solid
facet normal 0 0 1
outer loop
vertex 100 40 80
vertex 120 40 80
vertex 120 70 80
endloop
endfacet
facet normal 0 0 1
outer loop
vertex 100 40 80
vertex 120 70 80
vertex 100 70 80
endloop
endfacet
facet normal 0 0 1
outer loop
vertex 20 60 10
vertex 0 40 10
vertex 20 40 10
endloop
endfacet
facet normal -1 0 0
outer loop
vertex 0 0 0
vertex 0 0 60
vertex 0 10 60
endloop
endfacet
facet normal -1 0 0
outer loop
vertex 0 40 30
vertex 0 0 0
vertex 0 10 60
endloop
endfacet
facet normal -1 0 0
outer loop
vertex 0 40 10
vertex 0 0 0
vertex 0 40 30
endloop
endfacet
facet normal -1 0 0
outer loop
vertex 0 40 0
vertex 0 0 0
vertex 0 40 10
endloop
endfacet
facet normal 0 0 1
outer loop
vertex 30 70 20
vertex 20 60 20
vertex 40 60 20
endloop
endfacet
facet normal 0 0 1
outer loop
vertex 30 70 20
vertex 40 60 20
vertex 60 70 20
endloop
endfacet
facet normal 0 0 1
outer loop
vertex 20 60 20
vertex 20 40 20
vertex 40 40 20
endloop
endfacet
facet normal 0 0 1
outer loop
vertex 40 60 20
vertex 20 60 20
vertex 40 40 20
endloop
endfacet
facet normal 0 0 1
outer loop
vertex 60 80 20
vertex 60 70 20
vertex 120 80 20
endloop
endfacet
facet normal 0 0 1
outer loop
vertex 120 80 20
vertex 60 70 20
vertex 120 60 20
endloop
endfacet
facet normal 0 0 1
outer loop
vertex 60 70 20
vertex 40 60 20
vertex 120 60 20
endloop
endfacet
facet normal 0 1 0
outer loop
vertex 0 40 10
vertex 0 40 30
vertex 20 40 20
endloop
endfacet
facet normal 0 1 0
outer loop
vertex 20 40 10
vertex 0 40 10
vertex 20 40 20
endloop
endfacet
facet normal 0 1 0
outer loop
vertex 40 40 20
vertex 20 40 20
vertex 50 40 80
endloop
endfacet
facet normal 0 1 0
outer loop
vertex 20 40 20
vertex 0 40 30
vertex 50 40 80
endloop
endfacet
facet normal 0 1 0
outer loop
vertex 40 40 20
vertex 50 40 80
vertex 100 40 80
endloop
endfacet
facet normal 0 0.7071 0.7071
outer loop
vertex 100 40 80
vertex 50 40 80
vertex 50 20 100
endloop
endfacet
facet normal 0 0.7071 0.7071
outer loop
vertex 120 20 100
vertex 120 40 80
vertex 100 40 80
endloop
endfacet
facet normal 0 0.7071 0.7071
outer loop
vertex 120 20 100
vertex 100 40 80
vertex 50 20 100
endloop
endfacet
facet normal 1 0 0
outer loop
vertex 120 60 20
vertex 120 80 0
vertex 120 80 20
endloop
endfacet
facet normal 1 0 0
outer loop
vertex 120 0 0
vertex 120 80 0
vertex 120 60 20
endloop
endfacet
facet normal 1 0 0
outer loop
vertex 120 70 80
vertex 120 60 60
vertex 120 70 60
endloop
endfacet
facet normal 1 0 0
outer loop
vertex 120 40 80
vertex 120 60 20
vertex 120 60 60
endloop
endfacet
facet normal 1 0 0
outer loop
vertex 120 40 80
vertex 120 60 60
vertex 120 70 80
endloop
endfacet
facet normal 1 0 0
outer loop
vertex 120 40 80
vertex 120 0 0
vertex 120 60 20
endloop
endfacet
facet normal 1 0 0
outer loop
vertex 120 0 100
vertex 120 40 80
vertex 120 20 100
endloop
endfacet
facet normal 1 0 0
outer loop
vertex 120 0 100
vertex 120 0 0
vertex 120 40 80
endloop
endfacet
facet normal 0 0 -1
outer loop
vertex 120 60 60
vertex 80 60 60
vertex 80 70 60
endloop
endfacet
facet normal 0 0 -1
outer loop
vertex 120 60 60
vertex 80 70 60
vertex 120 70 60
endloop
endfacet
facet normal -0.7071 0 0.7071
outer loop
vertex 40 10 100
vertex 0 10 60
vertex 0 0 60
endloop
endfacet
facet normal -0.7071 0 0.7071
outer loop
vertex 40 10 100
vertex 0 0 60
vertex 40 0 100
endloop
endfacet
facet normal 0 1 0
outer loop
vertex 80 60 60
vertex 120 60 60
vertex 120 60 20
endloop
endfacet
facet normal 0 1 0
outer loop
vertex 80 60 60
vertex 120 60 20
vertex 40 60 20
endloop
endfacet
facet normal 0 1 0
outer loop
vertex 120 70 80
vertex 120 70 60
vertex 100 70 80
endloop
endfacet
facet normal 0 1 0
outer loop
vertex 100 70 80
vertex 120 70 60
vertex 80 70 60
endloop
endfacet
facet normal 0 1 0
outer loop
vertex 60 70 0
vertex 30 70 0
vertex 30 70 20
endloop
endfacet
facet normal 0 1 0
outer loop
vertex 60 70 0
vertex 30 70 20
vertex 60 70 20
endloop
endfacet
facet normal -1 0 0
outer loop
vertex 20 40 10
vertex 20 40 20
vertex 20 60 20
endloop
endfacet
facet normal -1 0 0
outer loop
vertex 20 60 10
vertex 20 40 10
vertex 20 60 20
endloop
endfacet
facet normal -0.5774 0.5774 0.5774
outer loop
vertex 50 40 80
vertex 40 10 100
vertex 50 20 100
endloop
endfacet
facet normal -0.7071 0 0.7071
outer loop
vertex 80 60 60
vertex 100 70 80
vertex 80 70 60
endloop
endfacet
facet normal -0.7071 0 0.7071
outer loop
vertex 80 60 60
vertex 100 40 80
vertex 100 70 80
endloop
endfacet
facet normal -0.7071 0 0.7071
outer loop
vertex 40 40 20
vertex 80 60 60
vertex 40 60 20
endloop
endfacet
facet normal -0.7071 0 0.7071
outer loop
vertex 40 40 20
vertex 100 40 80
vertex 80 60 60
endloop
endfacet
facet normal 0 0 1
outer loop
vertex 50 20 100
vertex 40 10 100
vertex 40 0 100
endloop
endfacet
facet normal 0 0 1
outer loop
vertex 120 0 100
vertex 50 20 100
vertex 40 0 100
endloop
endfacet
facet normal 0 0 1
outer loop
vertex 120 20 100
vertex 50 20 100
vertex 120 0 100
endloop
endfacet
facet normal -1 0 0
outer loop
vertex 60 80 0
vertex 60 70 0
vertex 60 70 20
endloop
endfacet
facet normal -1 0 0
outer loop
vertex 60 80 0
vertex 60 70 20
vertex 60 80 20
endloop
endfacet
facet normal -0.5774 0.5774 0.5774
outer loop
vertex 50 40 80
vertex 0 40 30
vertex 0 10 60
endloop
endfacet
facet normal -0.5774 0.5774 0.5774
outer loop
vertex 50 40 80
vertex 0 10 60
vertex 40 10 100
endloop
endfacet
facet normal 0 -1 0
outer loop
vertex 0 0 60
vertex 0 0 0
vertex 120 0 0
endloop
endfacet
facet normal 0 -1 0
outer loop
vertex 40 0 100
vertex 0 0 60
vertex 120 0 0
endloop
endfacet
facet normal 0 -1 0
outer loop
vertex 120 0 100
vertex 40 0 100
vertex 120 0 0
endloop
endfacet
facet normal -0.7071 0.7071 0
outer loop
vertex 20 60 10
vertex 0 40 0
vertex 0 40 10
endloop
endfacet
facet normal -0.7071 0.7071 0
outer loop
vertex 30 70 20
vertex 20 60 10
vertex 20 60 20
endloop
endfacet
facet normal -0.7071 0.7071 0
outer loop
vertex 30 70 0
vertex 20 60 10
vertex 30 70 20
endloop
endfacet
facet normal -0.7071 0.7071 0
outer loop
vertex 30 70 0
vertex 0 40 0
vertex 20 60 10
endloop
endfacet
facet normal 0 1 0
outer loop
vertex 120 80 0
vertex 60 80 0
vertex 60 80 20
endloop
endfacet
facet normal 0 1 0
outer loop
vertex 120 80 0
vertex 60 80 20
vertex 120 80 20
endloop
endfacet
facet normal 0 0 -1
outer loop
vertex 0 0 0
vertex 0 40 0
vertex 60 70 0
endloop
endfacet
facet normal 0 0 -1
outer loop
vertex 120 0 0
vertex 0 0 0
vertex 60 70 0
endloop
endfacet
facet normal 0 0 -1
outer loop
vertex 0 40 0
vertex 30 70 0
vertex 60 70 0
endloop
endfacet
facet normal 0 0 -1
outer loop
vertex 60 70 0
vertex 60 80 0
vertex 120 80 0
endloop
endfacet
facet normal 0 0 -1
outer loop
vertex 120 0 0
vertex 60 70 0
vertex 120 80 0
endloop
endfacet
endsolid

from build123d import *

# Parameters (mm, degrees)
SKETCH1_W           = 120
SKETCH1_H           = 80
BOSS_EXTRUDE1_DEPTH = 100
CUT_EXTRUDE1_DEPTH  = 100
CUT_EXTRUDE2_DEPTH  = 100
SKETCH4_W           = 120
SKETCH4_H           = 80
CUT_EXTRUDE3_DEPTH  = 100
CUT_EXTRUDE4_DEPTH  = 10
BOSS_EXTRUDE4_DEPTH = 20
BOSS_EXTRUDE5_DEPTH = 10
CUT_EXTRUDE8_DEPTH  = 156
CUT_EXTRUDE10_DEPTH = 156
CUT_EXTRUDE11_DEPTH = 156
CUT_EXTRUDE12_DEPTH = 156


with BuildPart() as part:
    # Sketch1 → Boss-Extrude1 (new body)
    with BuildSketch(Plane.XY):
        with Locations((60, 40)):
            Rectangle(SKETCH1_W, SKETCH1_H)
    extrude(amount=BOSS_EXTRUDE1_DEPTH)

    # Sketch2 → Cut-Extrude1 (cut)
    with BuildSketch(Plane(origin=(0, 80, 0), x_dir=(1, 0, 0), z_dir=(0, 1, 0))):
        Polygon((0, -60), (40, -100), (0, -100), align=None)
    extrude(amount=-CUT_EXTRUDE1_DEPTH, mode=Mode.SUBTRACT)

    # Sketch3 → Cut-Extrude2 (cut)
    with BuildSketch(Plane(origin=(0, 0, 0), x_dir=(-1, 0, 0), z_dir=(0, 0, -1))):
        Polygon((0, 40), (-30, 70), (-60, 70), (-60, 80), (0, 80), align=None)
    extrude(amount=-CUT_EXTRUDE2_DEPTH, mode=Mode.SUBTRACT)

    # Sketch4 → Cut-Extrude3 (cut)
    with BuildSketch(Plane(origin=(0, 40, 0), x_dir=(1, 0, 0), z_dir=(0, 1, 0))):
        with Locations((60, -60)):
            Rectangle(SKETCH4_W, SKETCH4_H)
    extrude(amount=CUT_EXTRUDE3_DEPTH, mode=Mode.SUBTRACT)

    # Sketch5 → Cut-Extrude4 (cut)
    with BuildSketch(Plane.XY.offset(20)):
        Polygon((20, 40), (20, 60), (0, 40), align=None)
    extrude(amount=-CUT_EXTRUDE4_DEPTH, mode=Mode.SUBTRACT)

    # Sketch6 → Boss-Extrude4 (add)
    with BuildSketch(Plane(origin=(0, 40, 0), x_dir=(1, 0, 0), z_dir=(0, 1, 0))):
        Polygon((40, -20), (120, -20), (120, -80), (100, -80), align=None)
    extrude(amount=BOSS_EXTRUDE4_DEPTH)

    # Sketch8 → Boss-Extrude5 (add)
    with BuildSketch(Plane(origin=(0, 60, 0), x_dir=(1, 0, 0), z_dir=(0, 1, 0))):
        Polygon((80, -60), (120, -60), (120, -80), (100, -80), align=None)
    extrude(amount=BOSS_EXTRUDE5_DEPTH)

    # Sketch9 → Cut-Extrude8 (cut)
    with BuildSketch(Plane(origin=(120, 0, 0), x_dir=(0, 0, -1), z_dir=(1, 0, 0))):
        Polygon((-100, 40), (-80, 40), (-100, 20), align=None)
    extrude(amount=-CUT_EXTRUDE8_DEPTH, mode=Mode.SUBTRACT)

    # Sketch13 → Cut-Extrude10 (cut)
    with BuildSketch(Plane(origin=(-23.333333333, 23.333333333, 23.333333333), x_dir=(0.816496581, 0.40824829, 0.40824829), z_dir=(-0.577350269, 0.577350269, 0.577350269))):
        Polygon((28.577380332, 7.071067812), (28.577380332, -35.355339059), (77.567175188, -63.639610307), (89.814623902, -28.284271247), align=None)
    extrude(amount=CUT_EXTRUDE10_DEPTH, mode=Mode.SUBTRACT)

    # Sketch14 → Cut-Extrude11 (cut)
    with BuildSketch(Plane(origin=(72.619047619, 14.523809524, 58.095238095), x_dir=(-0.605227533, -0.121045507, 0.786795792), z_dir=(-0.77151675, -0.15430335, -0.6172134))):
        Polygon((53.260022875, 1.961161351), (27.840466503, 29.417420271), (51.671300602, 13.237839122), align=None)
    extrude(amount=-CUT_EXTRUDE11_DEPTH, mode=Mode.SUBTRACT)

    # Sketch15 → Cut-Extrude12 (cut)
    with BuildSketch(Plane(origin=(-33.221457258, 0.897877223, 41.302352266), x_dir=(-0.779285755, -0.013620016, -0.626520716), z_dir=(0.626668742, -0.016936993, -0.779101679))):
        Polygon((-94.306519852, 17.821876236), (-92.355669011, 19.098748466), (-93.959701924, 7.824238347), align=None)
    extrude(amount=-CUT_EXTRUDE12_DEPTH, mode=Mode.SUBTRACT)


solid = part.part
